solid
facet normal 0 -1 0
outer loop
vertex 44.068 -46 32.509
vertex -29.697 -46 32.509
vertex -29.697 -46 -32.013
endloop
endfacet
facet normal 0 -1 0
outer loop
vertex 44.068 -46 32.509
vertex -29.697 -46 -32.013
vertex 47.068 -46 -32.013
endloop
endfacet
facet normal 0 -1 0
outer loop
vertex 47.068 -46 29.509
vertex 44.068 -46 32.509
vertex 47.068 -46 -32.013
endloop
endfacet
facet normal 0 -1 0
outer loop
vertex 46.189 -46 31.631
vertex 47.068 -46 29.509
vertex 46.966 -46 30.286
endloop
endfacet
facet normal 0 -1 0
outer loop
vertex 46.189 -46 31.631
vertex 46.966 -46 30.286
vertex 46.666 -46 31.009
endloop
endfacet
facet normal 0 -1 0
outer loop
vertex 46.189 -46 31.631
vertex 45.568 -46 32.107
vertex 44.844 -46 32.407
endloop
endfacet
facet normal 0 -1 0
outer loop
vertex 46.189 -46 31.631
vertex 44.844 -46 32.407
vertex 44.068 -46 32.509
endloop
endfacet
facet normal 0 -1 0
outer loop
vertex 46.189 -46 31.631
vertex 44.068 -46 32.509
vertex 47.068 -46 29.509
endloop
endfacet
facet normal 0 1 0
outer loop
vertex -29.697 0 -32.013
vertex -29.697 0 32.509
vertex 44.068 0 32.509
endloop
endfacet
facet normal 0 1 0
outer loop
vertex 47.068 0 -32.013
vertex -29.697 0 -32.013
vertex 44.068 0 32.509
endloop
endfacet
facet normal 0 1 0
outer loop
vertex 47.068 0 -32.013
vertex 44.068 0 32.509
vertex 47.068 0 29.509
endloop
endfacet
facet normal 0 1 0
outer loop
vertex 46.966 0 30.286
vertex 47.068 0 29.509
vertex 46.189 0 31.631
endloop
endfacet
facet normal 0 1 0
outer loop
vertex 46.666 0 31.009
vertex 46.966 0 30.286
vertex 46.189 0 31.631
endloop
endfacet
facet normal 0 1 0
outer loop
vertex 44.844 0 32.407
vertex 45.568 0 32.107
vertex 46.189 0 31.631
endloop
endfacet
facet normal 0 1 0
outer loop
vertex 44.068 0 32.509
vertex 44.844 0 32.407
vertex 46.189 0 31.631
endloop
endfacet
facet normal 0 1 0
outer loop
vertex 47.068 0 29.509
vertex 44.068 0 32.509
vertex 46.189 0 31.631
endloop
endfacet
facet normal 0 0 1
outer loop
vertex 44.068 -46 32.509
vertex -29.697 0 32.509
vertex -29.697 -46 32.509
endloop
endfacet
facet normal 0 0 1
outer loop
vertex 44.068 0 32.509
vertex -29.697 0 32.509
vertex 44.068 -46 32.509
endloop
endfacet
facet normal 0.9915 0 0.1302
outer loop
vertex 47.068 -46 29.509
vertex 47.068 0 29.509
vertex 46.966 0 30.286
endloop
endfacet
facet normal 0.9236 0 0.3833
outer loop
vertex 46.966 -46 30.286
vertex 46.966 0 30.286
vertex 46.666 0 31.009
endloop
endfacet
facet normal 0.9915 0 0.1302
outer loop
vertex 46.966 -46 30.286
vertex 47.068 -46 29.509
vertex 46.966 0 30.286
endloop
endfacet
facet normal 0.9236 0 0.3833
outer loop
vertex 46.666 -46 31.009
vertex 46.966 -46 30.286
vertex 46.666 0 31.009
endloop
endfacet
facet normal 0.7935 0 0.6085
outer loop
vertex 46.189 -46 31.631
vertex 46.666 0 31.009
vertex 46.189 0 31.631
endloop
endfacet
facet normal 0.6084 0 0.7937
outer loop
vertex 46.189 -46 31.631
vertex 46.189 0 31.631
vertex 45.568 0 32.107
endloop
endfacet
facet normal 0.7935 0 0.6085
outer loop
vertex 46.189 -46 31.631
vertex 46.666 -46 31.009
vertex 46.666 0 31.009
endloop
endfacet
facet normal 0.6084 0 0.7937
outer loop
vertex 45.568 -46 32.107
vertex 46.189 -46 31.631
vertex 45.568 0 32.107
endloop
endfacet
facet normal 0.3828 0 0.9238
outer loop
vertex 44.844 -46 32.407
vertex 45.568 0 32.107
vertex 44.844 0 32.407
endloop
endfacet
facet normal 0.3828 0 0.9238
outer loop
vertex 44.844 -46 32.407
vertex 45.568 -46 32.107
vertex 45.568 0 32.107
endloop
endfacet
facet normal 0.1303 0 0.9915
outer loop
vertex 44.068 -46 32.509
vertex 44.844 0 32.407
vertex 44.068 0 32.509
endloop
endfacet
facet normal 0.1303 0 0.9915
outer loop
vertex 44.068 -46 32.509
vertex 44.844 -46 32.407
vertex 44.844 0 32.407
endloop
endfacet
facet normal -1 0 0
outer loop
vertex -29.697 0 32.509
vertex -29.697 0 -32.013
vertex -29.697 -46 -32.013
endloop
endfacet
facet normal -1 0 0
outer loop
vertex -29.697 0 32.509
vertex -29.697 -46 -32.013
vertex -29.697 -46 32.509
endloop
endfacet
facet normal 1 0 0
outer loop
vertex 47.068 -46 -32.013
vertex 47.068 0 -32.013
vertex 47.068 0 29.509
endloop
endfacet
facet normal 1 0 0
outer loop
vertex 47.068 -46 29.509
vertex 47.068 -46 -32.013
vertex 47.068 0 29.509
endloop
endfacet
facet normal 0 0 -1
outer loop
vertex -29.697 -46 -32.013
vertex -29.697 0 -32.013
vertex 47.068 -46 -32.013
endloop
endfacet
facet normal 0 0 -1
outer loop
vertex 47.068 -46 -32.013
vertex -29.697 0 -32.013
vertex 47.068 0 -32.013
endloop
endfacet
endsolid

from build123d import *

# Parameters (mm, degrees)
F0_W     = 76.76471
F0_H     = 64.522062
F1_DEPTH = 46
F2_R     = 3


with BuildPart() as f1:
    # F0 (on Front) → F1 (new body)
    with BuildSketch(Plane.XZ):
        with Locations((8.685663, 0.248162)):
            Rectangle(F0_W, F0_H)
    extrude(amount=F1_DEPTH)

    # F2
    f2_edges = [f1.edges().sort_by_distance(p)[0] for p in [
        (47.068018, -23, 32.509193),
    ]]
    fillet(f2_edges, radius=F2_R)


solid = f1.part
